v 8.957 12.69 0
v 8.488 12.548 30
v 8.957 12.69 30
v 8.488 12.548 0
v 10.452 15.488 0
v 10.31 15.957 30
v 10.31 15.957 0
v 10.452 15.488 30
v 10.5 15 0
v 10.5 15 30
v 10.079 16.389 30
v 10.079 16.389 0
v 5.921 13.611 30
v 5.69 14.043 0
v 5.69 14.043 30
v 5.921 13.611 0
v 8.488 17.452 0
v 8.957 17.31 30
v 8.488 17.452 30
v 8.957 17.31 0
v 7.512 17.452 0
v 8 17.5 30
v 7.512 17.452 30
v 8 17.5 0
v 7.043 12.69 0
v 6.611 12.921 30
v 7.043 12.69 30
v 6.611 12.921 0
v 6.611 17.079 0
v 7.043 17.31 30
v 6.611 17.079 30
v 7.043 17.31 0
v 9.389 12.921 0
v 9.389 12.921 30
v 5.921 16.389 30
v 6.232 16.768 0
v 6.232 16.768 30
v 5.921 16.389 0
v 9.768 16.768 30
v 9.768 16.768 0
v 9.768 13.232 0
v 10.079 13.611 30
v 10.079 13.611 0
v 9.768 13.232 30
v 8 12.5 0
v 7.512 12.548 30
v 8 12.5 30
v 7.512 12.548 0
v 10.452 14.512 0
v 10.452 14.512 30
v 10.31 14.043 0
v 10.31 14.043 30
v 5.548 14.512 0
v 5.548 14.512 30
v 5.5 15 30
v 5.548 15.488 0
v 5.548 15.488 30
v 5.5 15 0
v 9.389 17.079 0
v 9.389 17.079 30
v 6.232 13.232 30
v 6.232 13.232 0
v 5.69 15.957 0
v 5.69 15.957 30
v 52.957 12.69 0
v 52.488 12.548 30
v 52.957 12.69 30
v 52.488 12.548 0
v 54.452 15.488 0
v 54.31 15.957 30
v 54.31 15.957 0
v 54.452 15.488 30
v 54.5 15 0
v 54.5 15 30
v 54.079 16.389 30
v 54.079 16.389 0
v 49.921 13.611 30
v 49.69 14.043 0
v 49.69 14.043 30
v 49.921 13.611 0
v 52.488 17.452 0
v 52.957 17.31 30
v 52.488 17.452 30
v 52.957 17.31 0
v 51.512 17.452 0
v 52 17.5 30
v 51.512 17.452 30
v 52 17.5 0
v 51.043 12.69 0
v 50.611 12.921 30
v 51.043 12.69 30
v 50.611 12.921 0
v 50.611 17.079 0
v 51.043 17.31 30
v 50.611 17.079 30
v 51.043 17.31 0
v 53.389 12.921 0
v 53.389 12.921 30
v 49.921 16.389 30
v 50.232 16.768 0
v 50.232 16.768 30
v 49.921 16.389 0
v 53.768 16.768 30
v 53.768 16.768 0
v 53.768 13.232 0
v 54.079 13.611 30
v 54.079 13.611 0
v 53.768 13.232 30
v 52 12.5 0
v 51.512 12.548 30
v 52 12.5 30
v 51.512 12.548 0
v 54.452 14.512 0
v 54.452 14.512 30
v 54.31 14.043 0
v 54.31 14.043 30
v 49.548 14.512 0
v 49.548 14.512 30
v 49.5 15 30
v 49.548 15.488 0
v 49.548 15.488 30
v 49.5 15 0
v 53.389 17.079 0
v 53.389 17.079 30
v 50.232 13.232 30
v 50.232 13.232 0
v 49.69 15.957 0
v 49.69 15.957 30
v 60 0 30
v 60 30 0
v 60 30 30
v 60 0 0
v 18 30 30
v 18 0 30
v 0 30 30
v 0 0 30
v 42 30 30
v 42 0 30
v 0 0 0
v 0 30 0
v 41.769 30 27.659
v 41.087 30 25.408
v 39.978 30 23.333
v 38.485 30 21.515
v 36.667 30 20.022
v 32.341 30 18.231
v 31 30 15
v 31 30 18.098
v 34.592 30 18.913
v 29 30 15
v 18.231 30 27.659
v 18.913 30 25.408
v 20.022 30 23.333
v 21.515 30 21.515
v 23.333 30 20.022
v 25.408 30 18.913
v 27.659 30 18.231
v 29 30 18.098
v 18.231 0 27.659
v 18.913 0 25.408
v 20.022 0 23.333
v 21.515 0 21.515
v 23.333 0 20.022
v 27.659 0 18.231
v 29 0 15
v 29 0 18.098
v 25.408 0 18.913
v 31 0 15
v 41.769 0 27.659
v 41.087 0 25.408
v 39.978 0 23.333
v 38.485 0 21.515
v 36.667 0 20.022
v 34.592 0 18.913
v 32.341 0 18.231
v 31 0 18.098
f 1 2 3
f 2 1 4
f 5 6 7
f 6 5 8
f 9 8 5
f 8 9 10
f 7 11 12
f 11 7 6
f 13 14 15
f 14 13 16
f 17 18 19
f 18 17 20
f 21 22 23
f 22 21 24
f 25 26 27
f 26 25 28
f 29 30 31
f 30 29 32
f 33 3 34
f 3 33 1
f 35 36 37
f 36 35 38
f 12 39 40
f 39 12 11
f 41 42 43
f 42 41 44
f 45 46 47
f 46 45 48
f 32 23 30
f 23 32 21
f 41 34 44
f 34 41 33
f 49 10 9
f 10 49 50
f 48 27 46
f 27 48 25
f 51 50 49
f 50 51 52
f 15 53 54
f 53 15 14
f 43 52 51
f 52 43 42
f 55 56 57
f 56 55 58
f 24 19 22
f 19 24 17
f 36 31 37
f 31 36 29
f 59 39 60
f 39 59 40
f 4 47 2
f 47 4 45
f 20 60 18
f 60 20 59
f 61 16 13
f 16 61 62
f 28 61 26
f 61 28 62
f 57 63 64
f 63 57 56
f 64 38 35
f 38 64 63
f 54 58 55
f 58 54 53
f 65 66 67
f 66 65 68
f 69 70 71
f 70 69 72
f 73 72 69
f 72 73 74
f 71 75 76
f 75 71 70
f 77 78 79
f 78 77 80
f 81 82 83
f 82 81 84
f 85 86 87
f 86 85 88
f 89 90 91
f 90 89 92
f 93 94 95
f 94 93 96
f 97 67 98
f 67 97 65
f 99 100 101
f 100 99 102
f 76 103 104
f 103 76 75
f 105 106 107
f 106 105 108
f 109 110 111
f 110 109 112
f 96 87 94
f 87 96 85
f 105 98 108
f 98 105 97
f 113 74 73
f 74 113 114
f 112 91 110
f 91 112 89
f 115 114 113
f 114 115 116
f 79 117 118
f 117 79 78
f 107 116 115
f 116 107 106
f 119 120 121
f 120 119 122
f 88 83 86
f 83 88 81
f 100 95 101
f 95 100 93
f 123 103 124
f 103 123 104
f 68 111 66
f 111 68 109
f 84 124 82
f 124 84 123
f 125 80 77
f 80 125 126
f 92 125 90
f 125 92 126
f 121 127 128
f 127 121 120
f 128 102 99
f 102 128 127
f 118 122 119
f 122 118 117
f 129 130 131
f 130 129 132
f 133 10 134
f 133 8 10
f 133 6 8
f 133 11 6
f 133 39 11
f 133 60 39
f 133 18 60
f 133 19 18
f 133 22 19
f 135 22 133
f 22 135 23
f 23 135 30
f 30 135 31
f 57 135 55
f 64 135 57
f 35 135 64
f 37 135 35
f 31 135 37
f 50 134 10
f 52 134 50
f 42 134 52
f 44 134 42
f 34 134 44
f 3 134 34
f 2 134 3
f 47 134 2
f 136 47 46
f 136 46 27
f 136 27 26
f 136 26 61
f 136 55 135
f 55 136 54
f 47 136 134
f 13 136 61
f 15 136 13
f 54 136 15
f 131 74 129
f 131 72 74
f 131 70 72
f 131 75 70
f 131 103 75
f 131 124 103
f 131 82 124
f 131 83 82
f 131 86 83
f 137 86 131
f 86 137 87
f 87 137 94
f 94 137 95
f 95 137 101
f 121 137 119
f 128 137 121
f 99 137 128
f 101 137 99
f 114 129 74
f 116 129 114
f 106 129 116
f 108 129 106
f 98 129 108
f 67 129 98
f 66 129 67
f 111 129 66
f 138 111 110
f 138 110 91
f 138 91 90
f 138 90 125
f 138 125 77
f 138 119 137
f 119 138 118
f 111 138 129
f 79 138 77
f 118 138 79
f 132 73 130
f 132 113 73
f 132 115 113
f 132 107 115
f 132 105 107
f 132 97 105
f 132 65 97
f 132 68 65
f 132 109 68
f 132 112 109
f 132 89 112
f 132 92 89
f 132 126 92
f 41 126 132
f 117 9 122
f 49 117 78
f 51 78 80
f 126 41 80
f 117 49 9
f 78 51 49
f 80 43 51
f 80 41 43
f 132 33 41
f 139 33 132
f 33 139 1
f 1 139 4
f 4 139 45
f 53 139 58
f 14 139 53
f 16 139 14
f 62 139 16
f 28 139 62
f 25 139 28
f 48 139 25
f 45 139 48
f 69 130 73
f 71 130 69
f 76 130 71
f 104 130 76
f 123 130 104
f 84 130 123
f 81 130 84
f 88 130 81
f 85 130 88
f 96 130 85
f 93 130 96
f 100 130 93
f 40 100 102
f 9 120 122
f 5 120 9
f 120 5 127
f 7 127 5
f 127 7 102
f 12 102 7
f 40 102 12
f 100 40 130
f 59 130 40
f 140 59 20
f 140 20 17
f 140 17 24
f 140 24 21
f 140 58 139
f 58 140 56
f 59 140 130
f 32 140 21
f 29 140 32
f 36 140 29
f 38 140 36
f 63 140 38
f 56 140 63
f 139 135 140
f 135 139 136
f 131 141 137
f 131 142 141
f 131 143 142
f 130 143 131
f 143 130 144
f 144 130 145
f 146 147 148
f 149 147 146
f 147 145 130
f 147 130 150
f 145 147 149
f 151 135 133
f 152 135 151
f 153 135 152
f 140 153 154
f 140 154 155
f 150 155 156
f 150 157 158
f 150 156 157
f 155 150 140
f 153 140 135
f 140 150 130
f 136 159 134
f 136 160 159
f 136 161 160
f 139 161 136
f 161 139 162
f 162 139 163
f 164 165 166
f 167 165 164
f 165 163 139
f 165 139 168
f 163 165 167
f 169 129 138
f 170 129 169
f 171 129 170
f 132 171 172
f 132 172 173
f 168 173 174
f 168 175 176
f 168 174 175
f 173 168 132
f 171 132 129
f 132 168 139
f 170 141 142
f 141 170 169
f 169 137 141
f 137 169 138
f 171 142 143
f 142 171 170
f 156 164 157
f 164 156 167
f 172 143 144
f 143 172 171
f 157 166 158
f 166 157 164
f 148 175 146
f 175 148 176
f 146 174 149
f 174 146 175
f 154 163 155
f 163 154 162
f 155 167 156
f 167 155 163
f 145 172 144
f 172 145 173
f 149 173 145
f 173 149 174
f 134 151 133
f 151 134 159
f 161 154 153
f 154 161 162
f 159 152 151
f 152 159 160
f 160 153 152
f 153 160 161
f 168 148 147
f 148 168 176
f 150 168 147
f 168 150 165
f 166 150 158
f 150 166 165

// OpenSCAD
$fn = 32;

// ----------------------------------------------------------------------
// Saddle clamp: split shaft clamp
// ----------------------------------------------------------------------

// --- parameters (mm) ---
blk_l = 60;               // block length, X
blk_w = 30;               // block width, Y
blk_h = 30;               // block height
clamp_r = 12;             // shaft groove radius
hole_r = 2.5;             // bolt hole radius
hole_m = 8;               // bolt hole margin from the ends
saw_w = 2;                // saw kerf width

saw_depth = clamp_r + 3;  // saw kerf depth

difference() {
  cube([blk_l, blk_w, blk_h]);
  translate([blk_l / 2, -1, blk_h])
    rotate([-90, 0, 0])
      cylinder(h = blk_w + 2, r = clamp_r);
  for (sx = [0, 1])
    translate([sx ? blk_l - hole_m : hole_m, blk_w / 2, -1])
      cylinder(r = hole_r, h = blk_h + 2);
  translate([blk_l / 2 - saw_w / 2, -1, blk_h - saw_depth])
    cube([saw_w, blk_w + 2, saw_depth + 1]);
}
